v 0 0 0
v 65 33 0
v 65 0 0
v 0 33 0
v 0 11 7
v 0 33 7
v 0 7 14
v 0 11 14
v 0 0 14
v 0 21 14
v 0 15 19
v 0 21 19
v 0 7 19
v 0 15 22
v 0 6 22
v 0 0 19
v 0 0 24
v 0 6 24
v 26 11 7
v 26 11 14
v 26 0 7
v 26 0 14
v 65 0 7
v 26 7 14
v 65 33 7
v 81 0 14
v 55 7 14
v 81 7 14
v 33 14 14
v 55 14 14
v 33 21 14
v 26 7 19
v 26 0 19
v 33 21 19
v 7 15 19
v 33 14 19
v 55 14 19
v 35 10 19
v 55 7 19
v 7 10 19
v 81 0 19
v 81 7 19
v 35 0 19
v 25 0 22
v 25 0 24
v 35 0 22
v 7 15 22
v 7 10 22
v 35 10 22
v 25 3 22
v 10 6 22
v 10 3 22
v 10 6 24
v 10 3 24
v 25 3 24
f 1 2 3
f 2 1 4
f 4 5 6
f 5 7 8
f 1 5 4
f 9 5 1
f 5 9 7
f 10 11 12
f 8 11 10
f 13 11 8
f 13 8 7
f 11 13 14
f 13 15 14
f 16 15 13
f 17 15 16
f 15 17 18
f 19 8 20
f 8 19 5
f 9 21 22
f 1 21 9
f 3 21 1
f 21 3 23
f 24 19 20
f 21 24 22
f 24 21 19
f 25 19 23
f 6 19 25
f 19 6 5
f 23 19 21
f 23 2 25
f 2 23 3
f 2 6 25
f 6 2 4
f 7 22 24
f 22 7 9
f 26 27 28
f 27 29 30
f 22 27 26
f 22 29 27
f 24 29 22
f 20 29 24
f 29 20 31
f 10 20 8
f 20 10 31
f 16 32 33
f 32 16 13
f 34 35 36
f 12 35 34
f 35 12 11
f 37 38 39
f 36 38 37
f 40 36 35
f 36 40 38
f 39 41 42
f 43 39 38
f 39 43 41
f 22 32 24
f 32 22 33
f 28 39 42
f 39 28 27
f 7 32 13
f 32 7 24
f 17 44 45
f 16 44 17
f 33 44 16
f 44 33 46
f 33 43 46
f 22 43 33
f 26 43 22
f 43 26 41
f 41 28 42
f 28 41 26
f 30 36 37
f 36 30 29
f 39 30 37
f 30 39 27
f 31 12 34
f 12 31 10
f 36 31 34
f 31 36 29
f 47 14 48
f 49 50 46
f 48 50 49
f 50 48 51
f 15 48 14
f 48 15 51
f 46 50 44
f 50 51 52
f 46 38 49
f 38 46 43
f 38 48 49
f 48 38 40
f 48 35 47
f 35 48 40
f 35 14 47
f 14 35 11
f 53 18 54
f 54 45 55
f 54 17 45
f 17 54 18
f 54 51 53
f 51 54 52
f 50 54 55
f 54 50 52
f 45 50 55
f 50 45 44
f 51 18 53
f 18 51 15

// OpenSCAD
translate([6.5, 5.5, 3.5]) color([0.3687041258820589, 0.20959132812878367, 0.5245146032105923]) cube([13, 11, 7], center=true);
translate([19.5, 5.5, 3.5]) color([0.1877850356496189, 0.2016215864664097, 0.6726678813176303]) cube([13, 11, 7], center=true);
translate([32.5, 5.5, 3.5]) color([0.7356026567617159, 0.31223209587410494, 0.8599943994333726]) cube([13, 11, 7], center=true);
translate([45.5, 5.5, 3.5]) color([0.2546391746557106, 0.34394037628155716, 0.712480390369609]) cube([13, 11, 7], center=true);
translate([58.5, 5.5, 3.5]) color([0.04450290132920964, 0.934183460116191, 0.07233773178762537]) cube([13, 11, 7], center=true);
translate([6.5, 16.5, 3.5]) color([0.4609310589380602, 0.7246048259600892, 0.04746853498479808]) cube([13, 11, 7], center=true);
translate([19.5, 16.5, 3.5]) color([0.8090026856371774, 0.9788933433114139, 0.460511672795628]) cube([13, 11, 7], center=true);
translate([32.5, 16.5, 3.5]) color([0.11812363628756806, 0.08147699565547994, 0.09873043616313526]) cube([13, 11, 7], center=true);
translate([45.5, 16.5, 3.5]) color([0.7654413741364753, 0.4140128484685186, 0.9192341581990311]) cube([13, 11, 7], center=true);
translate([58.5, 16.5, 3.5]) color([0.4406397760864845, 0.07714331014460807, 0.42693558751800065]) cube([13, 11, 7], center=true);
translate([6.5, 27.5, 3.5]) color([0.7548278934255565, 0.8293384268467949, 0.039351686529191854]) cube([13, 11, 7], center=true);
translate([19.5, 27.5, 3.5]) color([0.1803893912563338, 0.490013452023644, 0.12808547795160863]) cube([13, 11, 7], center=true);
translate([32.5, 27.5, 3.5]) color([0.8710926419421733, 0.9344608884461488, 0.3195969983538176]) cube([13, 11, 7], center=true);
translate([45.5, 27.5, 3.5]) color([0.43484368255202, 0.5570540644200566, 0.2855057910835891]) cube([13, 11, 7], center=true);
translate([58.5, 27.5, 3.5]) color([0.5410756974595614, 0.2011850454737838, 0.2966412512769129]) cube([13, 11, 7], center=true);
translate([6.5, 5.5, 10.5]) color([0.44178363318767744, 0.604669902191143, 0.5361650260862432]) cube([13, 11, 7], center=true);
translate([19.5, 5.5, 10.5]) color([0.2609879767339395, 0.23178787541805523, 0.11873023670071103]) cube([13, 11, 7], center=true);
translate([31.5, 3.5, 16.5]) color([0.7834936358921726, 0.09890076646638046, 0.7328850061793606]) cube([11, 7, 5], center=true);
translate([42.5, 3.5, 16.5]) color([0.2487736956630997, 0.28455698400578255, 0.7360834330107994]) cube([11, 7, 5], center=true);
translate([53.5, 3.5, 16.5]) color([0.6596207917216363, 0.7419215555155583, 0.5152830587943614]) cube([11, 7, 5], center=true);
translate([64.5, 3.5, 16.5]) color([0.8590958196652707, 0.12179389137547159, 0.6451969614065052]) cube([11, 7, 5], center=true);
translate([75.5, 3.5, 16.5]) color([0.11824431248865597, 0.7372833681454282, 0.3589046614584527]) cube([11, 7, 5], center=true);
translate([5.5, 10.5, 16.5]) color([0.67488210437111, 0.7034839134412817, 0.6606084576410584]) cube([11, 7, 5], center=true);
translate([16.5, 10.5, 16.5]) color([0.22155798032782648, 0.8317998863873537, 0.24013608742346748]) cube([11, 7, 5], center=true);
translate([27.5, 10.5, 16.5]) color([0.5181532972121122, 0.6746457541533513, 0.23360317478475656]) cube([11, 7, 5], center=true);
translate([38.5, 10.5, 16.5]) color([0.628511722983939, 0.2868310479973286, 0.1713823760843869]) cube([11, 7, 5], center=true);
translate([49.5, 10.5, 16.5]) color([0.809748828526577, 0.5531227700773604, 0.32788470660885605]) cube([11, 7, 5], center=true);
translate([5.5, 17.5, 16.5]) color([0.5854309472055399, 0.025286397427288332, 0.12982285676032723]) cube([11, 7, 5], center=true);
translate([16.5, 17.5, 16.5]) color([0.3955808516982431, 0.9757565794644123, 0.5104745178761232]) cube([11, 7, 5], center=true);
translate([27.5, 17.5, 16.5]) color([0.07645620506689521, 0.7650406152494567, 0.7814438709253152]) cube([11, 7, 5], center=true);
translate([3.5, 2.5, 20.5]) color([0.7748021743948562, 0.5694980380479538, 0.6956987378694627]) cube([7, 5, 3], center=true);
translate([10.5, 2.5, 20.5]) color([0.21345793631163135, 0.7325605908939883, 0.8161739873415944]) cube([7, 5, 3], center=true);
translate([17.5, 2.5, 20.5]) color([0.7599665402219192, 0.353462402585887, 0.5910280505757086]) cube([7, 5, 3], center=true);
translate([24.5, 2.5, 20.5]) color([0.6289893574898388, 0.9008098536570839, 0.1080138952733335]) cube([7, 5, 3], center=true);
translate([31.5, 2.5, 20.5]) color([0.8339337708504084, 0.5264355584690392, 0.3586141205519373]) cube([7, 5, 3], center=true);
translate([3.5, 7.5, 20.5]) color([0.4556029014937524, 0.012635498930738787, 0.22007359233142765]) cube([7, 5, 3], center=true);
translate([10.5, 7.5, 20.5]) color([0.6527634200680049, 0.660849279754449, 0.4946989402863131]) cube([7, 5, 3], center=true);
translate([17.5, 7.5, 20.5]) color([0.9533258805973196, 0.4809150885494712, 0.3139436595456605]) cube([7, 5, 3], center=true);
translate([24.5, 7.5, 20.5]) color([0.8477808391956414, 0.259158299397262, 0.6043059930343495]) cube([7, 5, 3], center=true);
translate([31.5, 7.5, 20.5]) color([0.7034188523223, 0.8216962986917842, 0.7853687501827489]) cube([7, 5, 3], center=true);
translate([3.5, 12.5, 20.5]) color([0.3840923305137113, 0.059180305962736934, 0.03828786548344276]) cube([7, 5, 3], center=true);
translate([2.5, 1.5, 23.0]) color([0.7264603879084595, 0.9616913814068508, 0.3431653742712939]) cube([5, 3, 2], center=true);
translate([7.5, 1.5, 23.0]) color([0.44119509807551416, 0.7257980157417766, 0.6578312458538799]) cube([5, 3, 2], center=true);
translate([12.5, 1.5, 23.0]) color([0.26010658848413604, 0.6715848457987025, 0.3049024195743838]) cube([5, 3, 2], center=true);
translate([17.5, 1.5, 23.0]) color([0.3563579065620385, 0.5395133052630944, 0.7323138239267305]) cube([5, 3, 2], center=true);
translate([22.5, 1.5, 23.0]) color([0.15121621156796483, 0.021987210892938758, 0.6278299544850219]) cube([5, 3, 2], center=true);
translate([2.5, 4.5, 23.0]) color([0.024564677785836264, 0.04496324071616853, 0.22577557672213355]) cube([5, 3, 2], center=true);
translate([7.5, 4.5, 23.0]) color([0.6538768733044555, 0.06654509768602879, 0.06240576762652772]) cube([5, 3, 2], center=true);
